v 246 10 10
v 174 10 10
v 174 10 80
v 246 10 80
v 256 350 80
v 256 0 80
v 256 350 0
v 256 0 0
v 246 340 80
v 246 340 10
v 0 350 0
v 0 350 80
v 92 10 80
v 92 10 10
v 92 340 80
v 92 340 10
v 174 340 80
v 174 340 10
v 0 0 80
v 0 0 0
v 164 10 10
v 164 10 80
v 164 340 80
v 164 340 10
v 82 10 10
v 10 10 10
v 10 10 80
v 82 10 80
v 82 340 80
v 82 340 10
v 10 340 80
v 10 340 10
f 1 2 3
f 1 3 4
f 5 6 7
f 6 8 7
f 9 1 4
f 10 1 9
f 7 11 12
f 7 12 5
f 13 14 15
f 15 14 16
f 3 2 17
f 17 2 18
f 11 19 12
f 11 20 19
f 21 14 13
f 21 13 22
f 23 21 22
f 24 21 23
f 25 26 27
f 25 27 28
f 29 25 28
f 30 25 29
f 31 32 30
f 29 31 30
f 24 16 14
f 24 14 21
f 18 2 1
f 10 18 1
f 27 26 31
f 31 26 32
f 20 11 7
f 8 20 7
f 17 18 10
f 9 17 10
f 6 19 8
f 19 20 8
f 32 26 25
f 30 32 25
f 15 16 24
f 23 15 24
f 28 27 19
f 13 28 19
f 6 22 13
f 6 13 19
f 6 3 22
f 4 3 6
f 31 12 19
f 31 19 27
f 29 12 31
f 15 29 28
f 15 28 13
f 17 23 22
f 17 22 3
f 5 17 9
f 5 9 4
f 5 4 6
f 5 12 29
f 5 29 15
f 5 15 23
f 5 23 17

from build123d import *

# Parameters (mm, degrees)
ESQUISSE1_W        = 256
ESQUISSE1_H        = 350
BOSS_EXTRU_1_DEPTH = 10
ESQUISSE2_W        = 256
ESQUISSE2_H        = 350
ESQUISSE2_W_2      = 236
ESQUISSE2_H_2      = 330
BOSS_EXTRU_2_DEPTH = 70
ESQUISSE3_W        = 10
ESQUISSE3_H        = 330
BOSS_EXTRU_3_DEPTH = 70


with BuildPart() as part:
    # Esquisse1 → Boss.-Extru.1 (new body)
    with BuildSketch(Plane.XY):
        with Locations((128, 175)):
            Rectangle(ESQUISSE1_W, ESQUISSE1_H)
    extrude(amount=BOSS_EXTRU_1_DEPTH)

    # Esquisse2 → Boss.-Extru.2 (add)
    with BuildSketch(Plane.XY.offset(10)):
        with Locations((128, 175)):
            Rectangle(ESQUISSE2_W, ESQUISSE2_H)
        with Locations((128, 175)):
            Rectangle(ESQUISSE2_W_2, ESQUISSE2_H_2, mode=Mode.SUBTRACT)
    extrude(amount=BOSS_EXTRU_2_DEPTH)

    # Esquisse3 → Boss.-Extru.3 (add)
    with BuildSketch(Plane.XY.offset(10)):
        with Locations((87, 175)):
            Rectangle(ESQUISSE3_W, ESQUISSE3_H)
        with Locations((169, 175)):
            Rectangle(ESQUISSE3_W, ESQUISSE3_H)
    extrude(amount=BOSS_EXTRU_3_DEPTH)


solid = part.part
